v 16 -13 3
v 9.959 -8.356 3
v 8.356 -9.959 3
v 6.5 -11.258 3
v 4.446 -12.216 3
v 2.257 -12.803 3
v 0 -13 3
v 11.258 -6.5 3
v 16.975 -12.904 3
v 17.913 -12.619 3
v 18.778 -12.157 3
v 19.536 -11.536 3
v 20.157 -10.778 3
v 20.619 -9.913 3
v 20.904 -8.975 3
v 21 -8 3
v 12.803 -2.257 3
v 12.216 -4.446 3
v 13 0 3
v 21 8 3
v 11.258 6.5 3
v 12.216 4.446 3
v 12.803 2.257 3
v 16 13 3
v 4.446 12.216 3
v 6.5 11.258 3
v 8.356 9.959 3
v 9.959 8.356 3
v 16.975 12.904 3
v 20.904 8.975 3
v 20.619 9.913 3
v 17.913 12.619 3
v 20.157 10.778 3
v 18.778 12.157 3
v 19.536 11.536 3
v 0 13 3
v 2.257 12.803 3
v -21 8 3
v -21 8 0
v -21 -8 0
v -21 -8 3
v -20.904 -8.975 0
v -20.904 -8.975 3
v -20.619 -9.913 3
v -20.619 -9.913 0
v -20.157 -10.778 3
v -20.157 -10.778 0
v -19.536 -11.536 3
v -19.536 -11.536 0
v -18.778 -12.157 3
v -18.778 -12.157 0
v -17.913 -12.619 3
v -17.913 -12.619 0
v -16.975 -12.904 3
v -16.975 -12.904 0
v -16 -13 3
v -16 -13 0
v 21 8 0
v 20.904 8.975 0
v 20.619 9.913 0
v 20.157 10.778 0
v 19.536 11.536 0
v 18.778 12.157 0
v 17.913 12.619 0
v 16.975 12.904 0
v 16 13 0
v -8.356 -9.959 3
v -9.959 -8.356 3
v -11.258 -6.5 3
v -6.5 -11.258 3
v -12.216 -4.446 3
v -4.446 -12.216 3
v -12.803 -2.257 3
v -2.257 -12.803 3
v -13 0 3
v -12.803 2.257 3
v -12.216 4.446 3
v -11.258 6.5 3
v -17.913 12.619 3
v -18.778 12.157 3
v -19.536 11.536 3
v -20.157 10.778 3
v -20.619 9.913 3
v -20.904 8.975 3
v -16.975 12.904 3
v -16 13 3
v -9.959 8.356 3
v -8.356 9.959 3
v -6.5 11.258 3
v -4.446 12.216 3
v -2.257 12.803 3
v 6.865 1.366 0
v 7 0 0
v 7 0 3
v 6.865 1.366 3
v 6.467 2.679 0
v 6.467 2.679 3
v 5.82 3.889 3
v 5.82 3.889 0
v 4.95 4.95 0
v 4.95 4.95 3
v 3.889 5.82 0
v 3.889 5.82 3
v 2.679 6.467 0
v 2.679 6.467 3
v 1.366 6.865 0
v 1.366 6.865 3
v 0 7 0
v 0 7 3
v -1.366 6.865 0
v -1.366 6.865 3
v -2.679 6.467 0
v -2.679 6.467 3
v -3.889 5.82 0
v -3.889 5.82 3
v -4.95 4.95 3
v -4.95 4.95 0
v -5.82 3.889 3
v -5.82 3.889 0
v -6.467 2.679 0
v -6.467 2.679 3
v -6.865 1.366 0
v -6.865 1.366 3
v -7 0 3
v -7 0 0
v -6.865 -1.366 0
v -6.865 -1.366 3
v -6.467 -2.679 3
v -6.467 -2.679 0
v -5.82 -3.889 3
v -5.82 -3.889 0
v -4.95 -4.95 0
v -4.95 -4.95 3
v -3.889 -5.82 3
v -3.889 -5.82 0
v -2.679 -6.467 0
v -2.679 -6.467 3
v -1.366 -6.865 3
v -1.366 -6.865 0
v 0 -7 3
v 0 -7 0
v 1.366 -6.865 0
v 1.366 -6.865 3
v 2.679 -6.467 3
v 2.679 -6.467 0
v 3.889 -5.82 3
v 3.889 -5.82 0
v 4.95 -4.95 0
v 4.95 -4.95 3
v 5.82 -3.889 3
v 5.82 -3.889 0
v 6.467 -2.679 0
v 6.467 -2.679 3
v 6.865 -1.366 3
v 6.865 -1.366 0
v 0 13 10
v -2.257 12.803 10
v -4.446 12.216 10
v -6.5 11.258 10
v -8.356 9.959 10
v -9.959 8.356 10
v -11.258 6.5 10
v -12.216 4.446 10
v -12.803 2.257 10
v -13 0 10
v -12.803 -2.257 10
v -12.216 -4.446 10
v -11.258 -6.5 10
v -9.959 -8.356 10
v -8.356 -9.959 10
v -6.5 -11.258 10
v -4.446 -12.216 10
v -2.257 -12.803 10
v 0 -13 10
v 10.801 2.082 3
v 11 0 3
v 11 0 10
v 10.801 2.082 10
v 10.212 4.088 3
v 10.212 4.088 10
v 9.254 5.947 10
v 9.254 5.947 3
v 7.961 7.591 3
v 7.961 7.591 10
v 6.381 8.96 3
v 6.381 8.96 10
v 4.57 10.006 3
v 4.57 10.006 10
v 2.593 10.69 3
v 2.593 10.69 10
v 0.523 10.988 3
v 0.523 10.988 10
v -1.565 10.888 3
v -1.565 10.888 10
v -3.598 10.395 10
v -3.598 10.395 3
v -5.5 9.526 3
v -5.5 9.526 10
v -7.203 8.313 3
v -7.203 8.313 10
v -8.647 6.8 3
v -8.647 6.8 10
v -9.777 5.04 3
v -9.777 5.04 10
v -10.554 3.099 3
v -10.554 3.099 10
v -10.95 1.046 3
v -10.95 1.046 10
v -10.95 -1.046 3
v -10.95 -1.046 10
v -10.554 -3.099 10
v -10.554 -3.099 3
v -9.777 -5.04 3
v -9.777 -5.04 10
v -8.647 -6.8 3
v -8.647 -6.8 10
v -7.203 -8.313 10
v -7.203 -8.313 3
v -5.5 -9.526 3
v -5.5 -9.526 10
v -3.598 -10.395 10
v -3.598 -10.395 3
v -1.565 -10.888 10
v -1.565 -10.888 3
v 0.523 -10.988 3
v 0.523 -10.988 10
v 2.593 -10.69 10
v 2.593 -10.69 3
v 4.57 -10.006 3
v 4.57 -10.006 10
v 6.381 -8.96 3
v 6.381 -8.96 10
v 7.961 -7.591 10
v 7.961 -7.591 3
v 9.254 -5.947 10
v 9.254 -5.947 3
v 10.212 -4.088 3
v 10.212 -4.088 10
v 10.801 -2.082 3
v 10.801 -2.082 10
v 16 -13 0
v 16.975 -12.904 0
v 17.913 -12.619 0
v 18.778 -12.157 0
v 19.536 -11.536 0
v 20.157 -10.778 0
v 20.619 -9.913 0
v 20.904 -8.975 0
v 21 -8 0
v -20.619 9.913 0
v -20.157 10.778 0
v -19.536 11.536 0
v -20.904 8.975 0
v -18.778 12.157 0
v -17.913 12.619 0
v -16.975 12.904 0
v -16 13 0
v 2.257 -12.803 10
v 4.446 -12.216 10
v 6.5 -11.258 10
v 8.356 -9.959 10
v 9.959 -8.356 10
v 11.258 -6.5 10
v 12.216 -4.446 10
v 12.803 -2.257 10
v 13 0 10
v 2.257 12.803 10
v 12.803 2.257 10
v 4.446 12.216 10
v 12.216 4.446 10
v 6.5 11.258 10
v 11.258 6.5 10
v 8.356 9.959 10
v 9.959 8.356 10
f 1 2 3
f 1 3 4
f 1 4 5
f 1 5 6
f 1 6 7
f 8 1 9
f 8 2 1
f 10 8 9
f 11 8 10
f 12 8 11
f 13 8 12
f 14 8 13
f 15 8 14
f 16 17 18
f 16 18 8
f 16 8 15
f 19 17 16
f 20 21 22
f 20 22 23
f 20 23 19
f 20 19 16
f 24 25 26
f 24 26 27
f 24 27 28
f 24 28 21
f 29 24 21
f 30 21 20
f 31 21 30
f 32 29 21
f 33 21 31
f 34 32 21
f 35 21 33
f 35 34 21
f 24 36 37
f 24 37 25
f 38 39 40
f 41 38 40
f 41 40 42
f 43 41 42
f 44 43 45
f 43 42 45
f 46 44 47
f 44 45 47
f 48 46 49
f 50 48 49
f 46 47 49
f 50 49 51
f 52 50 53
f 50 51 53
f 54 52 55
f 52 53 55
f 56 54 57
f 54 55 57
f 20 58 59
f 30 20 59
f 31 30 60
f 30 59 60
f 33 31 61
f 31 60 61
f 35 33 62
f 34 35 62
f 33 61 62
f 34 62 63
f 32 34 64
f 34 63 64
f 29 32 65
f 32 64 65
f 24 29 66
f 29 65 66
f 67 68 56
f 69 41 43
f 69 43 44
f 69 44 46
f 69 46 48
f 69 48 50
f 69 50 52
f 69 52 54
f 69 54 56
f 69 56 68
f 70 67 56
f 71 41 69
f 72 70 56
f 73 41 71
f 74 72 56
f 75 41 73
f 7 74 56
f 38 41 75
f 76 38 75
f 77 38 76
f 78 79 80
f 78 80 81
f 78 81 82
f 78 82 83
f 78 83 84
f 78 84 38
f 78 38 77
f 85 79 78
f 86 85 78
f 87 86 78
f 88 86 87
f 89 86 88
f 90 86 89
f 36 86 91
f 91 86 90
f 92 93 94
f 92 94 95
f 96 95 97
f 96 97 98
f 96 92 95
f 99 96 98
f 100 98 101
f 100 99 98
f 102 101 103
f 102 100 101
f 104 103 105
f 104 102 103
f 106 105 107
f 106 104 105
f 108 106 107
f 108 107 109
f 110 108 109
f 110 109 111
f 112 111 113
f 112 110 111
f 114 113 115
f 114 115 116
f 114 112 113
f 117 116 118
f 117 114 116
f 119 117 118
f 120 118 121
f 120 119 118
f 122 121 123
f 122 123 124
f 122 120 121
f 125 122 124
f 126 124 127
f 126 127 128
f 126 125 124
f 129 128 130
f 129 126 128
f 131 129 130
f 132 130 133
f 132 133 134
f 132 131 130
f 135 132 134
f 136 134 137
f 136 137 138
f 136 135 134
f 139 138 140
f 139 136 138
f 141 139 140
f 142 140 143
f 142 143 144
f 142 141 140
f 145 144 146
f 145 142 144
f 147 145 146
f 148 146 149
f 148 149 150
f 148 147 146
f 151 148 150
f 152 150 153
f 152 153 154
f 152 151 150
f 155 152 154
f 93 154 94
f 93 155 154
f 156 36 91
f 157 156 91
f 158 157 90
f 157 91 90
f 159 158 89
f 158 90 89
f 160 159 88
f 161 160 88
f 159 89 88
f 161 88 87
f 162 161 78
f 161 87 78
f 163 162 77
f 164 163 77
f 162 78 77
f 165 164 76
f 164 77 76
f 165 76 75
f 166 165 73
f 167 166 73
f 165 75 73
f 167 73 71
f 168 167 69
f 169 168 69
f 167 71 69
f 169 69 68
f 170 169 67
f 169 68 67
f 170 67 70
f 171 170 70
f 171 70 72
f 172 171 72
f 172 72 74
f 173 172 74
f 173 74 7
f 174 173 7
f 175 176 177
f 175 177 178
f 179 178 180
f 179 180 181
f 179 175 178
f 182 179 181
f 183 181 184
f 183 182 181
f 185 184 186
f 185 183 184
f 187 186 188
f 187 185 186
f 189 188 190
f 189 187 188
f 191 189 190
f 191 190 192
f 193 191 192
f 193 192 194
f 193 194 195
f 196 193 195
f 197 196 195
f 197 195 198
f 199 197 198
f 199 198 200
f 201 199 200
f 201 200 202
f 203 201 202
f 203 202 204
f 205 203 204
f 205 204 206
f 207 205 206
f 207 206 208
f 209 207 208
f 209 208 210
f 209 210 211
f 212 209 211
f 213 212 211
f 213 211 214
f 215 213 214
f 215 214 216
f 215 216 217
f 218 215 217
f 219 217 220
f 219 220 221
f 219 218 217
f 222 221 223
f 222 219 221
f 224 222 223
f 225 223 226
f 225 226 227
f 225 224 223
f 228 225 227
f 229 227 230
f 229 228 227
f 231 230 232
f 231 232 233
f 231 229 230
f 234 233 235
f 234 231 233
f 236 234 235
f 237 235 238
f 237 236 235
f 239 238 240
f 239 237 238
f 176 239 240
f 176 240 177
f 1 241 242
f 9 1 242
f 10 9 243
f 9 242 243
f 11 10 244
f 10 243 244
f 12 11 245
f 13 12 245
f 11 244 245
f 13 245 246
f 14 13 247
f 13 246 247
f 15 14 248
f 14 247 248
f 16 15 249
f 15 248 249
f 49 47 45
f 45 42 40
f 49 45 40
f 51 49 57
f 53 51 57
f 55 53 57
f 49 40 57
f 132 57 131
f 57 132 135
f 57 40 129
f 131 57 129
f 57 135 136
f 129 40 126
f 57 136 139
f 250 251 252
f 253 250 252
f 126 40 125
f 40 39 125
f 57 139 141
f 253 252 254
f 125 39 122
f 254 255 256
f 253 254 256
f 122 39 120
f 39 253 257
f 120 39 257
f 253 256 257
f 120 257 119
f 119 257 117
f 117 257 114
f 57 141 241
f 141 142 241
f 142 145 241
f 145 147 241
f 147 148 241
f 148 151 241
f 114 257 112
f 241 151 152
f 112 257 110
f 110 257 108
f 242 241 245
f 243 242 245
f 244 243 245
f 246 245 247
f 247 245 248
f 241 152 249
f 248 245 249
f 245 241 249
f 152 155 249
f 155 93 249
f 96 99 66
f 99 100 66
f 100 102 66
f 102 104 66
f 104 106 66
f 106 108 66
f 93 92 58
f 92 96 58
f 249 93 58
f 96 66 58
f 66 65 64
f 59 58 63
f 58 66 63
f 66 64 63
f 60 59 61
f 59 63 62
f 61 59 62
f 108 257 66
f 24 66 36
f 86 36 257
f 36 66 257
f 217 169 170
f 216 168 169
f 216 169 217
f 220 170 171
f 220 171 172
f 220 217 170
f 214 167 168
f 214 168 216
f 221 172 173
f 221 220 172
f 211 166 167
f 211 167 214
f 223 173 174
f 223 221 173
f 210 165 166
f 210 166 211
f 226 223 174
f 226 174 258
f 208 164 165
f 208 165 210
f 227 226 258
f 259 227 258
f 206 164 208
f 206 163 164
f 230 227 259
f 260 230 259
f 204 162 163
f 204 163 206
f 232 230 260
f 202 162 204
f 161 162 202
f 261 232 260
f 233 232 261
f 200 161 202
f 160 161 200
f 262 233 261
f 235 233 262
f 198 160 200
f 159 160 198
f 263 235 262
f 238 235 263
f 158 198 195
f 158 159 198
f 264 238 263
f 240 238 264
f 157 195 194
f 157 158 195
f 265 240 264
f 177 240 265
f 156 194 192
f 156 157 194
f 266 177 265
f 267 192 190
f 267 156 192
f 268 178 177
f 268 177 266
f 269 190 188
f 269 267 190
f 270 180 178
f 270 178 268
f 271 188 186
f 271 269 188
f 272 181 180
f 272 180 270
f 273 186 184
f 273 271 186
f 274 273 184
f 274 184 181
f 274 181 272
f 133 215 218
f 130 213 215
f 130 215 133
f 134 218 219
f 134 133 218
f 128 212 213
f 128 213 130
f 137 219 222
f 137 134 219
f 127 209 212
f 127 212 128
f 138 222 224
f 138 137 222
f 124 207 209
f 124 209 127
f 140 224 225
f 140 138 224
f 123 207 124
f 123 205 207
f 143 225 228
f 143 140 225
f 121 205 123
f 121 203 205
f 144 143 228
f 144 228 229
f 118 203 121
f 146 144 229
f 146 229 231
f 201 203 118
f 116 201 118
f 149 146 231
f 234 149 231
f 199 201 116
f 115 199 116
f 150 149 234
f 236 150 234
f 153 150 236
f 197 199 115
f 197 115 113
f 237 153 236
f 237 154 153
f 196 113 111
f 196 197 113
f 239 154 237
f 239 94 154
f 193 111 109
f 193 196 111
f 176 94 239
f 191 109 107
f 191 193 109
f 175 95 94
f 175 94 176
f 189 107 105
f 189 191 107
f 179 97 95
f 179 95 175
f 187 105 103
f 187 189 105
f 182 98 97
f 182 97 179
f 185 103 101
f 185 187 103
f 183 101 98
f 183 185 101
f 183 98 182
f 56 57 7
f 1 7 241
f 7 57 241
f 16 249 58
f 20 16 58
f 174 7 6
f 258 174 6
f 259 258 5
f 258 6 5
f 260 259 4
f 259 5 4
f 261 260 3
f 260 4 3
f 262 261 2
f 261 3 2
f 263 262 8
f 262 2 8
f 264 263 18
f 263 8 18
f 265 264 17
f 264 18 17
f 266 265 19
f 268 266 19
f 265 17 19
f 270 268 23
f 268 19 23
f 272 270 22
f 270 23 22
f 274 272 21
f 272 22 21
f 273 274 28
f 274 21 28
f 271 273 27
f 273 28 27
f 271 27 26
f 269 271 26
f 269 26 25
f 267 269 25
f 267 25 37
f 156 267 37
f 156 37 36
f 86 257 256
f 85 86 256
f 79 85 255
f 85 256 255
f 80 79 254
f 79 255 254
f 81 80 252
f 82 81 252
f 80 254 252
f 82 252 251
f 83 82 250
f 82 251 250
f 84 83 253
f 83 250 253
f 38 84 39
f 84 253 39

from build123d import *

# Parameters (mm, degrees)
F1_DEPTH = 3
F0_R     = 11
F0_R_2   = 7
F2_DEPTH = 10


with BuildPart() as f1:
    # F0 (on Top) → F1 (new body)
    with BuildSketch(Plane.XY):
        with BuildLine():
            ThreePointArc((21, 8), (19.5355339059, 11.5355339059), (16, 13))
            Line((16, 13), (-1.88e-08, 13))
            ThreePointArc((-1.88e-08, 13), (9.1923881488, 9.1923881621), (13, 0))
            ThreePointArc((13, 0), (9.1923881554, -9.1923881554), (0, -13))
            Line((0, -13), (16, -13))
            ThreePointArc((16, -13), (19.5355339059, -11.5355339059), (21, -8))
            Line((21, -8), (21, 8))
        make_face()
    extrude(amount=F1_DEPTH)



with BuildPart() as f1b:
    # F0 (on Top) → F1, piece 2 (new body)
    with BuildSketch(Plane.XY):
        with BuildLine():
            ThreePointArc((0, -13), (-13, -9.4e-09), (-1.88e-08, 13))
            Line((-1.88e-08, 13), (-16, 13))
            ThreePointArc((-16, 13), (-19.5355339059, 11.5355339059), (-21, 8))
            Line((-21, 8), (-21, -8))
            ThreePointArc((-21, -8), (-19.5355339059, -11.5355339059), (-16, -13))
            Line((-16, -13), (0, -13))
        make_face()
    extrude(amount=F1_DEPTH)


with BuildPart() as f1c:
    # F0 (on Top) → F1, piece 3 (new body)
    with BuildSketch(Plane.XY):
        Circle(F0_R)
        Circle(F0_R_2, mode=Mode.SUBTRACT)
    extrude(amount=F1_DEPTH)


with BuildPart() as f1_1:
    add(f1.part)

    add(f1b.part)  # F2 merges F1b

    add(f1c.part)  # F2 merges F1c
    # F0 (on Top) → F2 (join)
    with BuildSketch(Plane.XY):
        with BuildLine():
            ThreePointArc((13, 0), (9.1923881488, 9.1923881621), (-1.88e-08, 13))
            ThreePointArc((-1.88e-08, 13), (-13, -9.4e-09), (0, -13))
            ThreePointArc((0, -13), (9.1923881554, -9.1923881554), (13, 0))
        make_face()
        Circle(F0_R, mode=Mode.SUBTRACT)
    extrude(amount=F2_DEPTH)


solid = f1_1.part
